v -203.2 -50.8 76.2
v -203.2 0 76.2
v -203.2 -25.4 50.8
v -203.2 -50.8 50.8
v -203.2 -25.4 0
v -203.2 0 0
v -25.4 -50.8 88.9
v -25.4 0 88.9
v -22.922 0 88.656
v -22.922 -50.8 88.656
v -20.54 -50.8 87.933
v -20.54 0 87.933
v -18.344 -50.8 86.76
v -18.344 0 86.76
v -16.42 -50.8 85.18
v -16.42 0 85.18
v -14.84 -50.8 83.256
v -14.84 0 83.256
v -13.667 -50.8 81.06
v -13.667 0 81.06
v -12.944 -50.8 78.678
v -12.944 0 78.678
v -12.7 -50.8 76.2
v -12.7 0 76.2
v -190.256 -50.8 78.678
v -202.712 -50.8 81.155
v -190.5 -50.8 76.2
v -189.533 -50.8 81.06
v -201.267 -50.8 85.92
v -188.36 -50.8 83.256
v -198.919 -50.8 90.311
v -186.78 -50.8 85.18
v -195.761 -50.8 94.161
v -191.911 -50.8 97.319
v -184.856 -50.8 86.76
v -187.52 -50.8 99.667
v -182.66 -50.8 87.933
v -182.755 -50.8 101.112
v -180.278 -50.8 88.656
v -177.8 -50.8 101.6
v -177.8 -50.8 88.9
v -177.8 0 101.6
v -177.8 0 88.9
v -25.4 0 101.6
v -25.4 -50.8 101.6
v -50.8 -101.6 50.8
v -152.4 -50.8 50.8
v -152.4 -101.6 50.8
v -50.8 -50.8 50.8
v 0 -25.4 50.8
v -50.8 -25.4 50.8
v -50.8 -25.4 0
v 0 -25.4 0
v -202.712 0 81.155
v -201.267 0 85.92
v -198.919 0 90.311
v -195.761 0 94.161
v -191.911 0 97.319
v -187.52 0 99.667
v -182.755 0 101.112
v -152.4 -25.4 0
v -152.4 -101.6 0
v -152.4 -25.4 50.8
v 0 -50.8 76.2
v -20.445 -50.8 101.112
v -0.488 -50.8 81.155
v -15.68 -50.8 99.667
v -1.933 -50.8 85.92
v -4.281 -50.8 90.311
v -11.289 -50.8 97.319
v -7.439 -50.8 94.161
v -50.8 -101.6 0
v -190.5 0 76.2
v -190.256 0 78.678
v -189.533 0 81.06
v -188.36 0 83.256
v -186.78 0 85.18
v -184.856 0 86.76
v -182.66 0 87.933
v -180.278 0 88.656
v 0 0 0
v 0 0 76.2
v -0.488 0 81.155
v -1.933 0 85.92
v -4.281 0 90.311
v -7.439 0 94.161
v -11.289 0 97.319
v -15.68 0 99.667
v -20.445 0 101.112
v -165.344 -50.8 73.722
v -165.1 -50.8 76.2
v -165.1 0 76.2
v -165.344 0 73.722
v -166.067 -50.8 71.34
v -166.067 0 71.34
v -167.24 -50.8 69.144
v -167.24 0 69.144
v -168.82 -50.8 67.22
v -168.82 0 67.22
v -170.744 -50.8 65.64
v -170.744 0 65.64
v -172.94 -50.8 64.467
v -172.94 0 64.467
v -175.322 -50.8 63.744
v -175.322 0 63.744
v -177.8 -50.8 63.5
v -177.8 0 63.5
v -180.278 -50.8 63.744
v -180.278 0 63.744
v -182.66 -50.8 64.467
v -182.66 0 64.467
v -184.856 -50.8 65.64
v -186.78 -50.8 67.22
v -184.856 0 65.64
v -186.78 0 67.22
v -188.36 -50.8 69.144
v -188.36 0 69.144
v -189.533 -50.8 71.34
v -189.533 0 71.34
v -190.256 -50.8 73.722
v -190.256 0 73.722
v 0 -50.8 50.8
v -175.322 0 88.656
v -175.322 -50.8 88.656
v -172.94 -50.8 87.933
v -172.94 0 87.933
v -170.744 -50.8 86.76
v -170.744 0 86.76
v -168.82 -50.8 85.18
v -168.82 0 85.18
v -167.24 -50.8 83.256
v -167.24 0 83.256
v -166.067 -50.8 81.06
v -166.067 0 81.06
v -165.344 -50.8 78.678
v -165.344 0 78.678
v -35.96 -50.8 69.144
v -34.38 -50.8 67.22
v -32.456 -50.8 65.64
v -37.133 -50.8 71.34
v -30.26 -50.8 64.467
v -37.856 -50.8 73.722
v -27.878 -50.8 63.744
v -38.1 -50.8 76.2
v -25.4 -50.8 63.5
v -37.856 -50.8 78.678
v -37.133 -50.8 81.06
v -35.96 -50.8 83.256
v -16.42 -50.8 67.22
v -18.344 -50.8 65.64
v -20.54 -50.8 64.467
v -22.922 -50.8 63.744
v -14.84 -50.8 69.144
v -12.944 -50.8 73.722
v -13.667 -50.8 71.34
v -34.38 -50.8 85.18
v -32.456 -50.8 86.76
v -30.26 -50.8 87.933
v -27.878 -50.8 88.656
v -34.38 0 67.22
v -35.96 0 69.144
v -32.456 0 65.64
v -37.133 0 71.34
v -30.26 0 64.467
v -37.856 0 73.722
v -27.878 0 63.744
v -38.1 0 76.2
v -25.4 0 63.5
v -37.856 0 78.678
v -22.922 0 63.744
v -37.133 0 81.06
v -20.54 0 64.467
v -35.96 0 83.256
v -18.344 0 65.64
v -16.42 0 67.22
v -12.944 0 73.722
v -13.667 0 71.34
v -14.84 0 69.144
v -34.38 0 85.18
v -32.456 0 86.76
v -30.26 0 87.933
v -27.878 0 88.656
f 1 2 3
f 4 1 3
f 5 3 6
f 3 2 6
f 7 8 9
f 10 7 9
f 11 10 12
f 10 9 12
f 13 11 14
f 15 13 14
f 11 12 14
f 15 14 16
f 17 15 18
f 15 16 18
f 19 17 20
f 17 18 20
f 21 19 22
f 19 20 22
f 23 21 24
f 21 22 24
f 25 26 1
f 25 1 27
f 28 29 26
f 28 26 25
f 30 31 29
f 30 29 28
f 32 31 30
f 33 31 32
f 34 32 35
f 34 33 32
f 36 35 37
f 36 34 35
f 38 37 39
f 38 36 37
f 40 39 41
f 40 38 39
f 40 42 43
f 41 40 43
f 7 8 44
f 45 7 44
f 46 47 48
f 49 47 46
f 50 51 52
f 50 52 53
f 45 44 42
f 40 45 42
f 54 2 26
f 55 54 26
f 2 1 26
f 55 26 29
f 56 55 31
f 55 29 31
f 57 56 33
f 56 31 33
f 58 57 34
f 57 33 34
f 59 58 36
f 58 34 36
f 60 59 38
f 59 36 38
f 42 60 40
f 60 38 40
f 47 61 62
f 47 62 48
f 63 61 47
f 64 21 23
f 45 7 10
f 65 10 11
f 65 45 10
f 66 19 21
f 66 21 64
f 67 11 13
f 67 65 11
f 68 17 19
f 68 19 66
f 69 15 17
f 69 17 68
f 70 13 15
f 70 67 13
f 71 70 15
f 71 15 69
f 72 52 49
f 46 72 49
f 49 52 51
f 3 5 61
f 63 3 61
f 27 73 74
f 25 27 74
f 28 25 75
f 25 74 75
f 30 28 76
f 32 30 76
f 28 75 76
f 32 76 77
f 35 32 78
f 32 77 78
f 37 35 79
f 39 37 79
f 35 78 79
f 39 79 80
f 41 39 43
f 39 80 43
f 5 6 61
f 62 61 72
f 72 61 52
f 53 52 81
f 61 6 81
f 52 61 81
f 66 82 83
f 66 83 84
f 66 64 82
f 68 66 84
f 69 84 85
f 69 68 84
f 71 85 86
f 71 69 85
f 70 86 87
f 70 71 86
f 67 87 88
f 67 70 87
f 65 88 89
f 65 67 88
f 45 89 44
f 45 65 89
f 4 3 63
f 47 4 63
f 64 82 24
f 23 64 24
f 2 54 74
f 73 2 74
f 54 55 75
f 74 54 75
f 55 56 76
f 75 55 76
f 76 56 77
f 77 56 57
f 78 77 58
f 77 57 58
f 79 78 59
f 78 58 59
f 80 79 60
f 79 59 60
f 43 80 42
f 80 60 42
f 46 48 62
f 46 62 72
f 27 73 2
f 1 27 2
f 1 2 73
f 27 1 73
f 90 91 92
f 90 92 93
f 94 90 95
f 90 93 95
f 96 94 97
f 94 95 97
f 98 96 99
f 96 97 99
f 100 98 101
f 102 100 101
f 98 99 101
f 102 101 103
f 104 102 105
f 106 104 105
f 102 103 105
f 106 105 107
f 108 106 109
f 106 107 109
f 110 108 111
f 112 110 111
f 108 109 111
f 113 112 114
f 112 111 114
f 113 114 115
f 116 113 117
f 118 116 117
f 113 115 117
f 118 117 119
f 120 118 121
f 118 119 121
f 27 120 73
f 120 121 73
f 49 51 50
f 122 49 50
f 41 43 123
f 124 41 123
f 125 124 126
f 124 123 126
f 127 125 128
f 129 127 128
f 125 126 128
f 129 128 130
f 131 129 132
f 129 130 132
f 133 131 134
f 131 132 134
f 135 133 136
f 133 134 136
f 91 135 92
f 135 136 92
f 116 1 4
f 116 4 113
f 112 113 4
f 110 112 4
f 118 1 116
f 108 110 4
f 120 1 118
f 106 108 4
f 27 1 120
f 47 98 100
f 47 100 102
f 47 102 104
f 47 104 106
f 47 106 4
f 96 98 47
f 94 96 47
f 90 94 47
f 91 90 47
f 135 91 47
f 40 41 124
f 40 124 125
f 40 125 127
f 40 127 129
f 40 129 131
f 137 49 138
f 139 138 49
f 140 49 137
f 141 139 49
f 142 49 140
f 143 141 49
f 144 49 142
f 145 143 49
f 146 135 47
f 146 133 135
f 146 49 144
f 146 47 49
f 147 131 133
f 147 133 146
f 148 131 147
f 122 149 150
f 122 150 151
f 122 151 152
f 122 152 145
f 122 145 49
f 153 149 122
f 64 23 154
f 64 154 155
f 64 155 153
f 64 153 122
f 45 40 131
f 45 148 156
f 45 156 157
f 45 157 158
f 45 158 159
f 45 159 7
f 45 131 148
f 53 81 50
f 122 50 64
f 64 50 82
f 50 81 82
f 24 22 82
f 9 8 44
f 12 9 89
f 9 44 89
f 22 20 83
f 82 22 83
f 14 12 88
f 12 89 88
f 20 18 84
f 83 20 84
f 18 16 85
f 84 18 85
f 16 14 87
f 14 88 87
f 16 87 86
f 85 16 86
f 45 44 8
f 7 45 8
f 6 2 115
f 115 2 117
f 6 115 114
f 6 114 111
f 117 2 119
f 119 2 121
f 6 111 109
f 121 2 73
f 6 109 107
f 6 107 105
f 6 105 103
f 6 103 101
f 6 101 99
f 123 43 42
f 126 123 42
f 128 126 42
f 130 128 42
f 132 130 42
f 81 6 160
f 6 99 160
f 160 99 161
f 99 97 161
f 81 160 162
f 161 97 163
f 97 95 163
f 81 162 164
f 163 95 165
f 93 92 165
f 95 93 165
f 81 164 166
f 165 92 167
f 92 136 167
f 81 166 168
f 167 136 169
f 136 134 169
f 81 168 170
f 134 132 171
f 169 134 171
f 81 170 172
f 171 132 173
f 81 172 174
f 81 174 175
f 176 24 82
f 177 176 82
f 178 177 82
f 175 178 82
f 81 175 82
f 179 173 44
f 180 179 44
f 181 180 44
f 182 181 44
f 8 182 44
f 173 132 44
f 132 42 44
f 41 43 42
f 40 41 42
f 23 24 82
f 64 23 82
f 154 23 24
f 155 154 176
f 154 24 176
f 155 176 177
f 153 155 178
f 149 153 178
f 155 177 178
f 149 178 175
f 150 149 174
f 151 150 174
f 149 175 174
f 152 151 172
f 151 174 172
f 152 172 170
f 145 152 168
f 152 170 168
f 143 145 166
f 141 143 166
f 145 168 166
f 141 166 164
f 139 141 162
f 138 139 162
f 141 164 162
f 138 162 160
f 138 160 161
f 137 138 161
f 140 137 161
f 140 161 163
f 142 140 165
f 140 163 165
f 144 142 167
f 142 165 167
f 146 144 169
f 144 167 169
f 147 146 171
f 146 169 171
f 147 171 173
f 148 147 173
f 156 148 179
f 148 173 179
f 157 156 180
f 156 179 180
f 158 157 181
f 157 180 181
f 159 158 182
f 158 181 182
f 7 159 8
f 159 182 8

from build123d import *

# Parameters (mm, degrees)
F0_W     = 101.6
F0_H     = 50.8
F1_DEPTH = 101.6
F0_W_2   = 50.8
F2_DEPTH = 25.4
F3_DEPTH = 50.8
F4_DEPTH = 50.8
F5_R     = 25.39999
F5_2_R   = 25.39999


# Not quite as in the source:
# - a fillet or chamfer is up to 0.001 mm smaller than in the source, because OpenCascade refuses the exact size


with BuildPart() as f1:
    # F0 (on Front) → F1 (new body)
    with BuildSketch(Plane.XZ):
        with Locations((-101.6, 25.4)):
            Rectangle(F0_W, F0_H)
    extrude(amount=F1_DEPTH)

    # F0 (on Front) → F2 (join)
    with BuildSketch(Plane.XZ):
        with Locations((-177.8, 25.4)):
            Rectangle(F0_W_2, F0_H)
        with Locations((-25.4, 25.4)):
            Rectangle(F0_W_2, F0_H)
    extrude(amount=F2_DEPTH)

    # F0 (on Front) → F3 (join)
    with BuildSketch(Plane.XZ):
        with BuildLine():
            Line((-50.8, 50.8), (0, 50.8))
            Line((0, 50.8), (0, 76.2))
            Line((0, 76.2), (-12.7, 76.2))
            ThreePointArc((-12.7, 76.2), (-34.3802561211, 67.2197438789), (-25.4, 88.9))
            Line((-25.4, 88.9), (-25.4, 101.6))
            Line((-25.4, 101.6), (-177.8, 101.6))
            Line((-177.8, 101.6), (-177.8, 88.9))
            ThreePointArc((-177.8, 88.9), (-168.8197438789, 85.1802561211), (-165.1, 76.2))
            ThreePointArc((-165.1, 76.2), (-177.8, 63.5), (-190.5, 76.2))
            Line((-190.5, 76.2), (-203.2, 76.2))
            Line((-203.2, 76.2), (-203.2, 50.8))
            Line((-203.2, 50.8), (-152.4, 50.8))
            Line((-152.4, 50.8), (-50.8, 50.8))
        make_face()
    extrude(amount=F3_DEPTH)


with BuildPart() as f4:
    # F0 (on Front) → F4 (new body)
    with BuildSketch(Plane.XZ):
        with BuildLine():
            Line((-12.7, 76.2), (0, 76.2))
            Line((0, 76.2), (0, 101.6))
            Line((0, 101.6), (-25.4, 101.6))
            Line((-25.4, 101.6), (-25.4, 88.9))
            ThreePointArc((-25.4, 88.9), (-16.4197438789, 85.1802561211), (-12.7, 76.2))
        make_face()
    extrude(amount=F4_DEPTH)

    # F5 (radius 25.4 in the source; OpenCascade refuses exactly that, so slightly less here)
    f5_edges = [f4.edges().sort_by_distance(p)[0] for p in [
        (0, -25.4, 101.6),
    ]]
    fillet(f5_edges, radius=F5_R)


with BuildPart() as f4b:
    # F0 (on Front) → F4, piece 2 (new body)
    with BuildSketch(Plane.XZ):
        with BuildLine():
            Line((-203.2, 101.6), (-203.2, 76.2))
            Line((-203.2, 76.2), (-190.5, 76.2))
            ThreePointArc((-190.5, 76.2), (-186.7802561211, 85.1802561211), (-177.8, 88.9))
            Line((-177.8, 88.9), (-177.8, 101.6))
            Line((-177.8, 101.6), (-203.2, 101.6))
        make_face()
    extrude(amount=F4_DEPTH)

    # F5#2 (radius 25.4 in the source; OpenCascade refuses exactly that, so slightly less here)
    f5_2_edges = [f4b.edges().sort_by_distance(p)[0] for p in [
        (-203.2, -25.4, 101.6),
    ]]
    fillet(f5_2_edges, radius=F5_2_R)


solid = Compound([f1.part, f4.part, f4b.part])
